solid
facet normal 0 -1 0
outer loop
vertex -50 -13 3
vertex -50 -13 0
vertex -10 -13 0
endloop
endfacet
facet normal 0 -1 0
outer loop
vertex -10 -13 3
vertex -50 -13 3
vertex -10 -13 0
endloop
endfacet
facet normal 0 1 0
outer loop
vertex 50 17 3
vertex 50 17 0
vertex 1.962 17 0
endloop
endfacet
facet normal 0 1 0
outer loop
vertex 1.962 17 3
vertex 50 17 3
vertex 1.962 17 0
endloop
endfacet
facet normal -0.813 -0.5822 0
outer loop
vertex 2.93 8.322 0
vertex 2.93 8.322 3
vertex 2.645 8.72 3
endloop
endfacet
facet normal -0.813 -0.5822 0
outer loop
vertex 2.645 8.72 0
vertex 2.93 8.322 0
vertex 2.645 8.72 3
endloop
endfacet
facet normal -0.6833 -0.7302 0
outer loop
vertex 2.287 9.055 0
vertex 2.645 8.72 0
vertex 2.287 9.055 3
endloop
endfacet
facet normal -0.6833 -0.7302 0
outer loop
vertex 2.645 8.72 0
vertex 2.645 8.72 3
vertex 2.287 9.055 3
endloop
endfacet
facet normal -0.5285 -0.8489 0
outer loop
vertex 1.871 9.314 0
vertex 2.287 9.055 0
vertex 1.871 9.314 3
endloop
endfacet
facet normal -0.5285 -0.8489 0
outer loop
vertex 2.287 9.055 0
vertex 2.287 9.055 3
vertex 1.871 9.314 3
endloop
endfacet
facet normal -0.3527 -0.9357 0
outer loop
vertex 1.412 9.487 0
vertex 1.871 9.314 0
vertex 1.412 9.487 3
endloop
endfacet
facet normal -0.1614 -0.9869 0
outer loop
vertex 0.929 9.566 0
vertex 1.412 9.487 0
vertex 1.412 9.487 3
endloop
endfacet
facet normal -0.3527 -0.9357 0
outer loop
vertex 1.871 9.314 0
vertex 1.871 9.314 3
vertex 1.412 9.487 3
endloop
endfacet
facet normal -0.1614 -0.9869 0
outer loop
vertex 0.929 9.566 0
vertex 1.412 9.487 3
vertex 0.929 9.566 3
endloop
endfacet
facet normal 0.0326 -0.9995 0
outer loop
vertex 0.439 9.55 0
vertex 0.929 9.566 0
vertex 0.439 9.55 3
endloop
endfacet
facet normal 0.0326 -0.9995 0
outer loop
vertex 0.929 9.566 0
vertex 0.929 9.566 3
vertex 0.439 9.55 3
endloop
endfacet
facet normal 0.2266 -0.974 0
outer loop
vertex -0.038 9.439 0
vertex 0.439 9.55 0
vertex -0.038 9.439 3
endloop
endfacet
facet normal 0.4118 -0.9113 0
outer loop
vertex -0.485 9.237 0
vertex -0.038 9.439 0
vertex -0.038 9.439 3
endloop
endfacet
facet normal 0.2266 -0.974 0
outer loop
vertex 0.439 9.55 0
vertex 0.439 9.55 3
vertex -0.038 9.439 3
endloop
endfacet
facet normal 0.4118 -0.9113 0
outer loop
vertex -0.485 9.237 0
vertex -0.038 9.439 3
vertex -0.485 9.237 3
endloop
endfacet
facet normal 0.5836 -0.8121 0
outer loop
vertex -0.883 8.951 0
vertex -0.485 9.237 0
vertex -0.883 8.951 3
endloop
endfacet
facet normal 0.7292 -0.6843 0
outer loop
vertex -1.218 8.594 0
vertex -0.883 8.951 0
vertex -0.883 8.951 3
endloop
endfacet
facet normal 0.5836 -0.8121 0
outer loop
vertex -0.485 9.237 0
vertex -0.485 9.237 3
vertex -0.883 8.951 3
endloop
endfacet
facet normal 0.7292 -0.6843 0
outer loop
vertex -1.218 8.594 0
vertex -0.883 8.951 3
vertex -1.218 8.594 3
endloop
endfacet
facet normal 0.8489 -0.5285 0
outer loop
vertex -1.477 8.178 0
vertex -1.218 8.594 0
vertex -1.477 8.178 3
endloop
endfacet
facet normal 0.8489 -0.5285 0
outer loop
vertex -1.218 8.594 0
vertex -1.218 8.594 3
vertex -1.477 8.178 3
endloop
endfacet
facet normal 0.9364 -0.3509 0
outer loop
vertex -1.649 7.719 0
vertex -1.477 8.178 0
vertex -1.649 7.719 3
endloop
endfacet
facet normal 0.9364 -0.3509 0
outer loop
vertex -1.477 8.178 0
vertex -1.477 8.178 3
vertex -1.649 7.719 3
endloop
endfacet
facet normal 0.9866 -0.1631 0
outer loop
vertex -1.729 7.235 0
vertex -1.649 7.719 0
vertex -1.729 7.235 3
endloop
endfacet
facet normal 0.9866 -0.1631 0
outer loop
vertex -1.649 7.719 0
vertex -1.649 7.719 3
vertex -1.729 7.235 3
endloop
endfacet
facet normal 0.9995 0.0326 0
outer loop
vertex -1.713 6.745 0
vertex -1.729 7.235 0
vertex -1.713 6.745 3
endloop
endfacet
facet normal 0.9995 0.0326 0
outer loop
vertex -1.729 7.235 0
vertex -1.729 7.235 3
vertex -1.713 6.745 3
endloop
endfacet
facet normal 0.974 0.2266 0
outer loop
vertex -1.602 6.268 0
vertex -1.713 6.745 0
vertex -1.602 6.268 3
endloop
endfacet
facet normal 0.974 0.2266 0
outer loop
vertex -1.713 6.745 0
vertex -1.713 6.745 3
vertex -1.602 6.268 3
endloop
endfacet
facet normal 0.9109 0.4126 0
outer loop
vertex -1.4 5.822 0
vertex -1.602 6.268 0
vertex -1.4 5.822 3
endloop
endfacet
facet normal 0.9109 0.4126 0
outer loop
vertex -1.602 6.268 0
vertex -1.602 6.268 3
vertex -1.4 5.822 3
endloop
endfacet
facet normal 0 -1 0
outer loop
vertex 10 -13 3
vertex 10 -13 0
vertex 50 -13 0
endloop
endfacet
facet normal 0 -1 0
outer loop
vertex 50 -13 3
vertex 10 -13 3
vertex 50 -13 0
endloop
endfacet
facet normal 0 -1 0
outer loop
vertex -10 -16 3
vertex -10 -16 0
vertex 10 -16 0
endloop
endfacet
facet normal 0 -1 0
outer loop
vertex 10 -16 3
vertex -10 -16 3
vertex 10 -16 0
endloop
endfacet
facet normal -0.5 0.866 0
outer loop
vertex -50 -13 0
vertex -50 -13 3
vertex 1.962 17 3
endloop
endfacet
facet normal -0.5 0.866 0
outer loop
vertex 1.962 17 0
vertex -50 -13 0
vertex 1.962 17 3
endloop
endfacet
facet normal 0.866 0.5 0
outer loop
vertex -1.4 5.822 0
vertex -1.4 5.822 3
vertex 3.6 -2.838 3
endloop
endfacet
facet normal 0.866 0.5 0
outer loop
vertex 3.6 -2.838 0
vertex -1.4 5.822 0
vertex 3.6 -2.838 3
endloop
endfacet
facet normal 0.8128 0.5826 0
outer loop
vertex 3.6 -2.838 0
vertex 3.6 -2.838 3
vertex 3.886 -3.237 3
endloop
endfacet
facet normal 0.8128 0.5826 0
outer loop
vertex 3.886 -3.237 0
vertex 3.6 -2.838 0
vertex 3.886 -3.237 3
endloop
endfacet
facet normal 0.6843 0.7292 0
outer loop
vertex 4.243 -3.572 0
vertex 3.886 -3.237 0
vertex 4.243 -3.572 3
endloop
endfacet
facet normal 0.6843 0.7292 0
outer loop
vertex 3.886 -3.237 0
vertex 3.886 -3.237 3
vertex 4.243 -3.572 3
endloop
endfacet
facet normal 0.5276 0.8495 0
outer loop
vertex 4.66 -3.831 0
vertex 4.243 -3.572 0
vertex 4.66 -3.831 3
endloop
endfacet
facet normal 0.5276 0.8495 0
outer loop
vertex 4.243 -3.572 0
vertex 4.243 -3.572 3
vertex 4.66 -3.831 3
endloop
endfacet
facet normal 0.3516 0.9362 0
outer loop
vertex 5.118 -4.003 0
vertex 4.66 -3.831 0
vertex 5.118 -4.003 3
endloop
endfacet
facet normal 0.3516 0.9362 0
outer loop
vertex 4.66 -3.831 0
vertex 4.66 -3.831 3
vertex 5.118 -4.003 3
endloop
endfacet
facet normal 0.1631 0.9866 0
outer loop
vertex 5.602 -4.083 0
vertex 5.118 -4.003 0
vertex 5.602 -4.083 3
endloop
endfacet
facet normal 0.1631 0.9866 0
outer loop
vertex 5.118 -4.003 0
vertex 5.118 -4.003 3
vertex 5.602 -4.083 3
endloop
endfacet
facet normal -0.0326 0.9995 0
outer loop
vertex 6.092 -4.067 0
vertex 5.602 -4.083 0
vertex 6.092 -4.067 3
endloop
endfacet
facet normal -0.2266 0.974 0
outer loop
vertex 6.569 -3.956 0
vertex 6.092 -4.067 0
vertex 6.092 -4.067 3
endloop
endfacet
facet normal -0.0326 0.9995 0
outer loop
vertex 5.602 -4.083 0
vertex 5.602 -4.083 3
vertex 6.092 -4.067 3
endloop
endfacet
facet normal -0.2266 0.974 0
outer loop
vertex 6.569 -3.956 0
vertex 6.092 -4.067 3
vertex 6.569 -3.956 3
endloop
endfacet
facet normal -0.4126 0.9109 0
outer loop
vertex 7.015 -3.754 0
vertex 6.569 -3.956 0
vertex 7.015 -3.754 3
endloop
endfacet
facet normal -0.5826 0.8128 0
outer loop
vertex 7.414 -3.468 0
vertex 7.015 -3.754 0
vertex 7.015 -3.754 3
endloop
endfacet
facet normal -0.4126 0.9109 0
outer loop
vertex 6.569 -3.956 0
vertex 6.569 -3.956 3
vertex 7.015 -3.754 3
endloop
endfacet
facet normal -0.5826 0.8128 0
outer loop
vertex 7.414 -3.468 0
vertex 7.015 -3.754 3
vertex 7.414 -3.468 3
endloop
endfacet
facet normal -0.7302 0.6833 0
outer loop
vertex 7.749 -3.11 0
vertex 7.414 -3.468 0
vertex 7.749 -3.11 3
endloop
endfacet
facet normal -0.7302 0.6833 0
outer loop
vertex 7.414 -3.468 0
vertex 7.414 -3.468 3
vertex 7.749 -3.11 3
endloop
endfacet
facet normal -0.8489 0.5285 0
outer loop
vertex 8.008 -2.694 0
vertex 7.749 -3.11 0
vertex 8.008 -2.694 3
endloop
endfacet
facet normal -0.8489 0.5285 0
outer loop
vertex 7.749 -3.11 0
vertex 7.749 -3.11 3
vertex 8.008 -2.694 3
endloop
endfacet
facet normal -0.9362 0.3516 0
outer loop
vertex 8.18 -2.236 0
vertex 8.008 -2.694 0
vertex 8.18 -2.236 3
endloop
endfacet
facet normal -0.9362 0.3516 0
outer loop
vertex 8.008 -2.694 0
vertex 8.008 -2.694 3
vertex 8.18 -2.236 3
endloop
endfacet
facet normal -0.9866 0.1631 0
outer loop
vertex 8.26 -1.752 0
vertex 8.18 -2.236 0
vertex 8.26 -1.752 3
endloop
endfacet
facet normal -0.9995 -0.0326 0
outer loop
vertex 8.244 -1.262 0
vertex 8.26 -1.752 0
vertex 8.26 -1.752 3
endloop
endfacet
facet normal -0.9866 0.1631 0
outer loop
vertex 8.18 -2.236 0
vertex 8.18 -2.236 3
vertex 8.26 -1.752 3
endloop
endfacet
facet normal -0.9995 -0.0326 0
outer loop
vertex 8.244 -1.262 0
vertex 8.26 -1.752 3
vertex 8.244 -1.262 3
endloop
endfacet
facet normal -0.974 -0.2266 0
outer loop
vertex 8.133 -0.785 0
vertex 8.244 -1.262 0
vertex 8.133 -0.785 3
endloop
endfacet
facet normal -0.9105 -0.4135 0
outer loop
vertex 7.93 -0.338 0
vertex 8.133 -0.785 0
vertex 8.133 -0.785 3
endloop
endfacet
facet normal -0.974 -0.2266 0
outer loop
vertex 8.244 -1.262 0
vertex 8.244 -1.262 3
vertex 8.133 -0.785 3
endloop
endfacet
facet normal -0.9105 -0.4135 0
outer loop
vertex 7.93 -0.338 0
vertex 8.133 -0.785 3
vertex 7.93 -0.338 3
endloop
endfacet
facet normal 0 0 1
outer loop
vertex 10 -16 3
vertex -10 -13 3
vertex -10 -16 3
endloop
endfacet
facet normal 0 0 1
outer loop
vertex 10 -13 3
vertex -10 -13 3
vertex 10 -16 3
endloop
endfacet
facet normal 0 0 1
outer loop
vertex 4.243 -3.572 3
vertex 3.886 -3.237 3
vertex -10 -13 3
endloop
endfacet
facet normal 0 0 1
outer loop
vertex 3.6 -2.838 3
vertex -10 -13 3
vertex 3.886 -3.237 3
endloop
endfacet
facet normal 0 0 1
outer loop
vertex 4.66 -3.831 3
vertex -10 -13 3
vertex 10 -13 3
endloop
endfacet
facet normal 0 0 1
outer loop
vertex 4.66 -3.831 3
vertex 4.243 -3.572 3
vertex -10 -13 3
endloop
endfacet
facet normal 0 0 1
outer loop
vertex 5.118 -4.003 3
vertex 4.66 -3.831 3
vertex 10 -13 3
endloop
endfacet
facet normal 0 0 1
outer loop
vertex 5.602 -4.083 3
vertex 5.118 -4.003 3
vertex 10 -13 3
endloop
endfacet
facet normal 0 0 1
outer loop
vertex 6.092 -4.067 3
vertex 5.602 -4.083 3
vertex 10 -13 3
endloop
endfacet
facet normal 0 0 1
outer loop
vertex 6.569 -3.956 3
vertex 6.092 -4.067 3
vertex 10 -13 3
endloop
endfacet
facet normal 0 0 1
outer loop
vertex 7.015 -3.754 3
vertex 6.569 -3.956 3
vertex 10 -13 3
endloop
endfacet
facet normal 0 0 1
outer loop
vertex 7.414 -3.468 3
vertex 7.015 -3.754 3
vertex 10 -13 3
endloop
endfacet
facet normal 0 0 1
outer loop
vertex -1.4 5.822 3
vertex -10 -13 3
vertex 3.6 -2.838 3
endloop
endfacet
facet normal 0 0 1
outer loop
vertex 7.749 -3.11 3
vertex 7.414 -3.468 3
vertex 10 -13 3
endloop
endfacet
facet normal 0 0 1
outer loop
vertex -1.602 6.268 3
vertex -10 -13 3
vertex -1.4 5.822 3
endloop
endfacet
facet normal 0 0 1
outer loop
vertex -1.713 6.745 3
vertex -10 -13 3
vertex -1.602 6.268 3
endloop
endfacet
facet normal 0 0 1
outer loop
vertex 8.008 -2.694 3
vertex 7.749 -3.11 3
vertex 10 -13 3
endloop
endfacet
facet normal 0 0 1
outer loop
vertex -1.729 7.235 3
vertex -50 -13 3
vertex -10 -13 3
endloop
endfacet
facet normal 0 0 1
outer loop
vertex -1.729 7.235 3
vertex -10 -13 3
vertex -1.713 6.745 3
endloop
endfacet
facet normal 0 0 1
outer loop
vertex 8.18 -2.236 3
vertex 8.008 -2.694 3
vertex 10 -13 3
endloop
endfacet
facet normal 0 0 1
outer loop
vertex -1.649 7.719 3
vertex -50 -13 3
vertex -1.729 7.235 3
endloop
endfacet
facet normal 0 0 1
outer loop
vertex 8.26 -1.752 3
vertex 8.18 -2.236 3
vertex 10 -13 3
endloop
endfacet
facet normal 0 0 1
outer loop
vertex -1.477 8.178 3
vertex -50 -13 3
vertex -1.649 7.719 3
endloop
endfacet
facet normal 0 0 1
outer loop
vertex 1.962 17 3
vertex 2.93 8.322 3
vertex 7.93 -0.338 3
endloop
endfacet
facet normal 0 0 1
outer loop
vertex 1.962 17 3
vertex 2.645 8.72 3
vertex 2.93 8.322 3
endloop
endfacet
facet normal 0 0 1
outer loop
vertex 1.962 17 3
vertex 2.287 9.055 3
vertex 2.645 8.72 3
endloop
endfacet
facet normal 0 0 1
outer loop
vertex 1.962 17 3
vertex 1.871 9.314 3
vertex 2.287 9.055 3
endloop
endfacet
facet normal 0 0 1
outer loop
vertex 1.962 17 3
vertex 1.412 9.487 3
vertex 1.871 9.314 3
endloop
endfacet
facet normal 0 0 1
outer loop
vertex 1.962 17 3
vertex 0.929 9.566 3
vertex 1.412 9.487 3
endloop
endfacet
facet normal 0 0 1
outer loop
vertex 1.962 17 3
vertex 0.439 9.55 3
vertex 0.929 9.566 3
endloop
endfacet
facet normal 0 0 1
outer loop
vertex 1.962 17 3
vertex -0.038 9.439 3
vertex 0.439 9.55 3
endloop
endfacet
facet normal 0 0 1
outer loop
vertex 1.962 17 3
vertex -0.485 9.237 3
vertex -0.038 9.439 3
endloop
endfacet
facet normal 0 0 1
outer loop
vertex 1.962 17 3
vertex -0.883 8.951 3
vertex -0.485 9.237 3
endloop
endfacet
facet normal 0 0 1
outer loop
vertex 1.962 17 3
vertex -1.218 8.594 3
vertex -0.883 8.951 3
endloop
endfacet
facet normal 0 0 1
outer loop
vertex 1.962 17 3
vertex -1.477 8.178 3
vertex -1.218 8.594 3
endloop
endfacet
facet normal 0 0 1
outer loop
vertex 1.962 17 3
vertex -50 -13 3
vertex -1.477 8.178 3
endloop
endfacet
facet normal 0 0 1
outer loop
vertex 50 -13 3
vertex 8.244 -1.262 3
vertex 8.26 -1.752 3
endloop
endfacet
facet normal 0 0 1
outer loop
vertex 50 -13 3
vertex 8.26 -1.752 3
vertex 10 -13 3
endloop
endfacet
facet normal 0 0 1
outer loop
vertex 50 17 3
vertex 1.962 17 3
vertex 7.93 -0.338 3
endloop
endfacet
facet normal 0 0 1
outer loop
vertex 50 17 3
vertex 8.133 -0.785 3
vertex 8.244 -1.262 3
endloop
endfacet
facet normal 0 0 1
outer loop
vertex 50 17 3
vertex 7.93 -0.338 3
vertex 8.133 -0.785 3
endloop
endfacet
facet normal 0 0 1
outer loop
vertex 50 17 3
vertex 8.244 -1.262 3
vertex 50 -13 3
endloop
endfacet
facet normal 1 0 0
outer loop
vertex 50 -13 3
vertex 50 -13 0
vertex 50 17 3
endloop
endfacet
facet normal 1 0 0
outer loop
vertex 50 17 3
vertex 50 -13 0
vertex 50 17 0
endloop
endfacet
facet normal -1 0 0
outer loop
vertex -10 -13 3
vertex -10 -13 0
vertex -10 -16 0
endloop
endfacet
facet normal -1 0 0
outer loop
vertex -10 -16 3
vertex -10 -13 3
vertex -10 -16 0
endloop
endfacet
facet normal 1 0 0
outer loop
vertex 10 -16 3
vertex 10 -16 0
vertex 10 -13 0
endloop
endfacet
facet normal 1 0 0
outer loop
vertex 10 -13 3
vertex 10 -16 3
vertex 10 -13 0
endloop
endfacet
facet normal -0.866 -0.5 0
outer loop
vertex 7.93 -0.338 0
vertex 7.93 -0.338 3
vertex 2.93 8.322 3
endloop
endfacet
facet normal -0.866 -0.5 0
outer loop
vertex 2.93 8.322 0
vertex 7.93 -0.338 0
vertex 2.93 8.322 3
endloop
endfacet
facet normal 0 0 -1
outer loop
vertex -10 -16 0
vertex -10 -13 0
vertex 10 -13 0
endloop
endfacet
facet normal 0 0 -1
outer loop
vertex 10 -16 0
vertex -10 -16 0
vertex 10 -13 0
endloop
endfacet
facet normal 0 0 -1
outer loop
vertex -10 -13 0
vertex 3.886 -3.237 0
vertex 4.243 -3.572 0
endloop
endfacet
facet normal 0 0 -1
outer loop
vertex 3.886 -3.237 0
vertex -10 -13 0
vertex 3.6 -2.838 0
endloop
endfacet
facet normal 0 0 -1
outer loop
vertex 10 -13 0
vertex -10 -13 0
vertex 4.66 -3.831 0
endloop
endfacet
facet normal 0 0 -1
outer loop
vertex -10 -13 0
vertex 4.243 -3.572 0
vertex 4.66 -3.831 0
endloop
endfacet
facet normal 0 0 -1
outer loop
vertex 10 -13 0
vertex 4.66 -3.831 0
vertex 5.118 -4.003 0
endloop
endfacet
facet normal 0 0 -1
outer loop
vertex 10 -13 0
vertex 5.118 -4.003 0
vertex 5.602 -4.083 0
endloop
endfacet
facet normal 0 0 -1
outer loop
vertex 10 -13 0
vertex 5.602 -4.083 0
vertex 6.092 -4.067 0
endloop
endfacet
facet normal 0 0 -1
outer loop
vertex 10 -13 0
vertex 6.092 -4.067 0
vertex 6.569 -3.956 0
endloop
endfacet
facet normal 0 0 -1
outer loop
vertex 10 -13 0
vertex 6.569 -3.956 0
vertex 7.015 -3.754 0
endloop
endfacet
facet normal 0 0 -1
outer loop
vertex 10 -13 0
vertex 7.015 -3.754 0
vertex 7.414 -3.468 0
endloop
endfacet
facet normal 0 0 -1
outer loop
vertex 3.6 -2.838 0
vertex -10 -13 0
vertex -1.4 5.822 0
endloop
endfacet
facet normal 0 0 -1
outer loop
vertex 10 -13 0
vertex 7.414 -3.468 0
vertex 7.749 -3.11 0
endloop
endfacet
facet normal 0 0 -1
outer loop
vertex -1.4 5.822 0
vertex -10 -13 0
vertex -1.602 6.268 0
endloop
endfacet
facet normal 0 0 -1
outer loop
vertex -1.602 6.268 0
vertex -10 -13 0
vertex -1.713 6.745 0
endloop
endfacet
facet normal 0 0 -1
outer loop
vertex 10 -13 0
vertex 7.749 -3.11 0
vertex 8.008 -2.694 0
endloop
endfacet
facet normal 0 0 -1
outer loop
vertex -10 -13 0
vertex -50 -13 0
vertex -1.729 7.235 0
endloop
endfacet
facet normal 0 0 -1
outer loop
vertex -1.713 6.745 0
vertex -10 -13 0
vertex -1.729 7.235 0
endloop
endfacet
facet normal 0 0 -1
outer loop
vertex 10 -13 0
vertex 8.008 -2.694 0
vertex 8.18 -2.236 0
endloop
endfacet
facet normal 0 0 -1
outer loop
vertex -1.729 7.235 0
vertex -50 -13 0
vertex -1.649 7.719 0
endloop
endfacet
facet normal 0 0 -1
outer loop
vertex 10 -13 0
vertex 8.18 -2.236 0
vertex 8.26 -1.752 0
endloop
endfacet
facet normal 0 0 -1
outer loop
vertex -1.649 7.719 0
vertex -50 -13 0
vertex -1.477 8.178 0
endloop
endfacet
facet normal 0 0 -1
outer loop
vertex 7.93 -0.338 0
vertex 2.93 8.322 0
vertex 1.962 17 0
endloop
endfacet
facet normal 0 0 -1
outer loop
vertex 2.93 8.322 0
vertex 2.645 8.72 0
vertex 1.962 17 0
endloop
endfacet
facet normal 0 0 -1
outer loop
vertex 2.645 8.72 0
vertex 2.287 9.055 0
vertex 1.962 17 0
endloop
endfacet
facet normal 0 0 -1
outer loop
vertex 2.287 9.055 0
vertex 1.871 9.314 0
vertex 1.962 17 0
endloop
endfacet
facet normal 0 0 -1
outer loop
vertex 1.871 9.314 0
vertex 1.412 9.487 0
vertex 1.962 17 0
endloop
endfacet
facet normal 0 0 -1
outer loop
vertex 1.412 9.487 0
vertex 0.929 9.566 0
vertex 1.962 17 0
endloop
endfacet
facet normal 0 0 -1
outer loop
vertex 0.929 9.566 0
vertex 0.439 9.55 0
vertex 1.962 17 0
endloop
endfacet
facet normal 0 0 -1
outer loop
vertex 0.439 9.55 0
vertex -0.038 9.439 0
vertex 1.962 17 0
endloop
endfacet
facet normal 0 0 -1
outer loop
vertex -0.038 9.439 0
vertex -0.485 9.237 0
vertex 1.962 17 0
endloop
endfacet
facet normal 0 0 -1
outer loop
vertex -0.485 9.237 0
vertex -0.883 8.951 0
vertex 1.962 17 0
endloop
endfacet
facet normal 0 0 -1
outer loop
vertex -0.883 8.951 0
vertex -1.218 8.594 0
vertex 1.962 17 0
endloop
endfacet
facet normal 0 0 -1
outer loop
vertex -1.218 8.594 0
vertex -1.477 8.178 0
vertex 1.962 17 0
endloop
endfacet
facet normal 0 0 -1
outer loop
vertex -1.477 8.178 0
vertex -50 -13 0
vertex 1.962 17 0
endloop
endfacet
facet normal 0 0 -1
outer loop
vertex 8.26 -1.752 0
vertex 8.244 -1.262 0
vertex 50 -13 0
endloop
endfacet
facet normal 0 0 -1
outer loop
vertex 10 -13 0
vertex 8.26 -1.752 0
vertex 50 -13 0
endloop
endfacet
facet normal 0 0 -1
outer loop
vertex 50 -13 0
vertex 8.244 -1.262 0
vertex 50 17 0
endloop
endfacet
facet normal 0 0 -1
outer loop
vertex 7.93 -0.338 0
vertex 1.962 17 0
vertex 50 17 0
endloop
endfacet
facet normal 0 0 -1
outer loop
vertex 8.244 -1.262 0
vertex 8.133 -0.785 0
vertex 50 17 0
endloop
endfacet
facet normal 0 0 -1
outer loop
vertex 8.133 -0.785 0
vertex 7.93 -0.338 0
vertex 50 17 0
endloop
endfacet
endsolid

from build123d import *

# Parameters (mm, degrees)
BOSS_EXTRUDE1_DEPTH = 3
CUT_EXTRUDE1_DEPTH  = 4
CUT_EXTRUDE2_DEPTH  = 4


with BuildPart() as part:
    # Sketch1 → Boss-Extrude1 (new body)
    with BuildSketch(Plane.XY):
        Polygon((-10, -13), (-10, -16), (10, -16), (10, -13), (50, -13), (50, 17), (-50, 17), (-50, -13), align=None)
    extrude(amount=BOSS_EXTRUDE1_DEPTH)

    # Sketch2 → Cut-Extrude1 (cut)
    with BuildSketch(Plane.XY.offset(3)):
        Polygon((-50, -13), (1.961524227, 17), (-50, 17), align=None)
    extrude(amount=-CUT_EXTRUDE1_DEPTH, mode=Mode.SUBTRACT)

    # Sketch4 → Cut-Extrude2 (cut)
    with BuildSketch(Plane.XY.offset(3)):
        with BuildLine():
            Line((7.930435314, -0.338457268), (2.930435314, 8.32179677))
            ThreePointArc((2.930435314, 8.32179677), (-0.484628196, 9.236860279), (-1.399691705, 5.82179677))
            Line((-1.399691705, 5.82179677), (3.600308295, -2.838457268))
            ThreePointArc((3.600308295, -2.838457268), (7.015371804, -3.753520778), (7.930435314, -0.338457268))
        make_face()
    extrude(amount=-CUT_EXTRUDE2_DEPTH, mode=Mode.SUBTRACT)


solid = part.part
